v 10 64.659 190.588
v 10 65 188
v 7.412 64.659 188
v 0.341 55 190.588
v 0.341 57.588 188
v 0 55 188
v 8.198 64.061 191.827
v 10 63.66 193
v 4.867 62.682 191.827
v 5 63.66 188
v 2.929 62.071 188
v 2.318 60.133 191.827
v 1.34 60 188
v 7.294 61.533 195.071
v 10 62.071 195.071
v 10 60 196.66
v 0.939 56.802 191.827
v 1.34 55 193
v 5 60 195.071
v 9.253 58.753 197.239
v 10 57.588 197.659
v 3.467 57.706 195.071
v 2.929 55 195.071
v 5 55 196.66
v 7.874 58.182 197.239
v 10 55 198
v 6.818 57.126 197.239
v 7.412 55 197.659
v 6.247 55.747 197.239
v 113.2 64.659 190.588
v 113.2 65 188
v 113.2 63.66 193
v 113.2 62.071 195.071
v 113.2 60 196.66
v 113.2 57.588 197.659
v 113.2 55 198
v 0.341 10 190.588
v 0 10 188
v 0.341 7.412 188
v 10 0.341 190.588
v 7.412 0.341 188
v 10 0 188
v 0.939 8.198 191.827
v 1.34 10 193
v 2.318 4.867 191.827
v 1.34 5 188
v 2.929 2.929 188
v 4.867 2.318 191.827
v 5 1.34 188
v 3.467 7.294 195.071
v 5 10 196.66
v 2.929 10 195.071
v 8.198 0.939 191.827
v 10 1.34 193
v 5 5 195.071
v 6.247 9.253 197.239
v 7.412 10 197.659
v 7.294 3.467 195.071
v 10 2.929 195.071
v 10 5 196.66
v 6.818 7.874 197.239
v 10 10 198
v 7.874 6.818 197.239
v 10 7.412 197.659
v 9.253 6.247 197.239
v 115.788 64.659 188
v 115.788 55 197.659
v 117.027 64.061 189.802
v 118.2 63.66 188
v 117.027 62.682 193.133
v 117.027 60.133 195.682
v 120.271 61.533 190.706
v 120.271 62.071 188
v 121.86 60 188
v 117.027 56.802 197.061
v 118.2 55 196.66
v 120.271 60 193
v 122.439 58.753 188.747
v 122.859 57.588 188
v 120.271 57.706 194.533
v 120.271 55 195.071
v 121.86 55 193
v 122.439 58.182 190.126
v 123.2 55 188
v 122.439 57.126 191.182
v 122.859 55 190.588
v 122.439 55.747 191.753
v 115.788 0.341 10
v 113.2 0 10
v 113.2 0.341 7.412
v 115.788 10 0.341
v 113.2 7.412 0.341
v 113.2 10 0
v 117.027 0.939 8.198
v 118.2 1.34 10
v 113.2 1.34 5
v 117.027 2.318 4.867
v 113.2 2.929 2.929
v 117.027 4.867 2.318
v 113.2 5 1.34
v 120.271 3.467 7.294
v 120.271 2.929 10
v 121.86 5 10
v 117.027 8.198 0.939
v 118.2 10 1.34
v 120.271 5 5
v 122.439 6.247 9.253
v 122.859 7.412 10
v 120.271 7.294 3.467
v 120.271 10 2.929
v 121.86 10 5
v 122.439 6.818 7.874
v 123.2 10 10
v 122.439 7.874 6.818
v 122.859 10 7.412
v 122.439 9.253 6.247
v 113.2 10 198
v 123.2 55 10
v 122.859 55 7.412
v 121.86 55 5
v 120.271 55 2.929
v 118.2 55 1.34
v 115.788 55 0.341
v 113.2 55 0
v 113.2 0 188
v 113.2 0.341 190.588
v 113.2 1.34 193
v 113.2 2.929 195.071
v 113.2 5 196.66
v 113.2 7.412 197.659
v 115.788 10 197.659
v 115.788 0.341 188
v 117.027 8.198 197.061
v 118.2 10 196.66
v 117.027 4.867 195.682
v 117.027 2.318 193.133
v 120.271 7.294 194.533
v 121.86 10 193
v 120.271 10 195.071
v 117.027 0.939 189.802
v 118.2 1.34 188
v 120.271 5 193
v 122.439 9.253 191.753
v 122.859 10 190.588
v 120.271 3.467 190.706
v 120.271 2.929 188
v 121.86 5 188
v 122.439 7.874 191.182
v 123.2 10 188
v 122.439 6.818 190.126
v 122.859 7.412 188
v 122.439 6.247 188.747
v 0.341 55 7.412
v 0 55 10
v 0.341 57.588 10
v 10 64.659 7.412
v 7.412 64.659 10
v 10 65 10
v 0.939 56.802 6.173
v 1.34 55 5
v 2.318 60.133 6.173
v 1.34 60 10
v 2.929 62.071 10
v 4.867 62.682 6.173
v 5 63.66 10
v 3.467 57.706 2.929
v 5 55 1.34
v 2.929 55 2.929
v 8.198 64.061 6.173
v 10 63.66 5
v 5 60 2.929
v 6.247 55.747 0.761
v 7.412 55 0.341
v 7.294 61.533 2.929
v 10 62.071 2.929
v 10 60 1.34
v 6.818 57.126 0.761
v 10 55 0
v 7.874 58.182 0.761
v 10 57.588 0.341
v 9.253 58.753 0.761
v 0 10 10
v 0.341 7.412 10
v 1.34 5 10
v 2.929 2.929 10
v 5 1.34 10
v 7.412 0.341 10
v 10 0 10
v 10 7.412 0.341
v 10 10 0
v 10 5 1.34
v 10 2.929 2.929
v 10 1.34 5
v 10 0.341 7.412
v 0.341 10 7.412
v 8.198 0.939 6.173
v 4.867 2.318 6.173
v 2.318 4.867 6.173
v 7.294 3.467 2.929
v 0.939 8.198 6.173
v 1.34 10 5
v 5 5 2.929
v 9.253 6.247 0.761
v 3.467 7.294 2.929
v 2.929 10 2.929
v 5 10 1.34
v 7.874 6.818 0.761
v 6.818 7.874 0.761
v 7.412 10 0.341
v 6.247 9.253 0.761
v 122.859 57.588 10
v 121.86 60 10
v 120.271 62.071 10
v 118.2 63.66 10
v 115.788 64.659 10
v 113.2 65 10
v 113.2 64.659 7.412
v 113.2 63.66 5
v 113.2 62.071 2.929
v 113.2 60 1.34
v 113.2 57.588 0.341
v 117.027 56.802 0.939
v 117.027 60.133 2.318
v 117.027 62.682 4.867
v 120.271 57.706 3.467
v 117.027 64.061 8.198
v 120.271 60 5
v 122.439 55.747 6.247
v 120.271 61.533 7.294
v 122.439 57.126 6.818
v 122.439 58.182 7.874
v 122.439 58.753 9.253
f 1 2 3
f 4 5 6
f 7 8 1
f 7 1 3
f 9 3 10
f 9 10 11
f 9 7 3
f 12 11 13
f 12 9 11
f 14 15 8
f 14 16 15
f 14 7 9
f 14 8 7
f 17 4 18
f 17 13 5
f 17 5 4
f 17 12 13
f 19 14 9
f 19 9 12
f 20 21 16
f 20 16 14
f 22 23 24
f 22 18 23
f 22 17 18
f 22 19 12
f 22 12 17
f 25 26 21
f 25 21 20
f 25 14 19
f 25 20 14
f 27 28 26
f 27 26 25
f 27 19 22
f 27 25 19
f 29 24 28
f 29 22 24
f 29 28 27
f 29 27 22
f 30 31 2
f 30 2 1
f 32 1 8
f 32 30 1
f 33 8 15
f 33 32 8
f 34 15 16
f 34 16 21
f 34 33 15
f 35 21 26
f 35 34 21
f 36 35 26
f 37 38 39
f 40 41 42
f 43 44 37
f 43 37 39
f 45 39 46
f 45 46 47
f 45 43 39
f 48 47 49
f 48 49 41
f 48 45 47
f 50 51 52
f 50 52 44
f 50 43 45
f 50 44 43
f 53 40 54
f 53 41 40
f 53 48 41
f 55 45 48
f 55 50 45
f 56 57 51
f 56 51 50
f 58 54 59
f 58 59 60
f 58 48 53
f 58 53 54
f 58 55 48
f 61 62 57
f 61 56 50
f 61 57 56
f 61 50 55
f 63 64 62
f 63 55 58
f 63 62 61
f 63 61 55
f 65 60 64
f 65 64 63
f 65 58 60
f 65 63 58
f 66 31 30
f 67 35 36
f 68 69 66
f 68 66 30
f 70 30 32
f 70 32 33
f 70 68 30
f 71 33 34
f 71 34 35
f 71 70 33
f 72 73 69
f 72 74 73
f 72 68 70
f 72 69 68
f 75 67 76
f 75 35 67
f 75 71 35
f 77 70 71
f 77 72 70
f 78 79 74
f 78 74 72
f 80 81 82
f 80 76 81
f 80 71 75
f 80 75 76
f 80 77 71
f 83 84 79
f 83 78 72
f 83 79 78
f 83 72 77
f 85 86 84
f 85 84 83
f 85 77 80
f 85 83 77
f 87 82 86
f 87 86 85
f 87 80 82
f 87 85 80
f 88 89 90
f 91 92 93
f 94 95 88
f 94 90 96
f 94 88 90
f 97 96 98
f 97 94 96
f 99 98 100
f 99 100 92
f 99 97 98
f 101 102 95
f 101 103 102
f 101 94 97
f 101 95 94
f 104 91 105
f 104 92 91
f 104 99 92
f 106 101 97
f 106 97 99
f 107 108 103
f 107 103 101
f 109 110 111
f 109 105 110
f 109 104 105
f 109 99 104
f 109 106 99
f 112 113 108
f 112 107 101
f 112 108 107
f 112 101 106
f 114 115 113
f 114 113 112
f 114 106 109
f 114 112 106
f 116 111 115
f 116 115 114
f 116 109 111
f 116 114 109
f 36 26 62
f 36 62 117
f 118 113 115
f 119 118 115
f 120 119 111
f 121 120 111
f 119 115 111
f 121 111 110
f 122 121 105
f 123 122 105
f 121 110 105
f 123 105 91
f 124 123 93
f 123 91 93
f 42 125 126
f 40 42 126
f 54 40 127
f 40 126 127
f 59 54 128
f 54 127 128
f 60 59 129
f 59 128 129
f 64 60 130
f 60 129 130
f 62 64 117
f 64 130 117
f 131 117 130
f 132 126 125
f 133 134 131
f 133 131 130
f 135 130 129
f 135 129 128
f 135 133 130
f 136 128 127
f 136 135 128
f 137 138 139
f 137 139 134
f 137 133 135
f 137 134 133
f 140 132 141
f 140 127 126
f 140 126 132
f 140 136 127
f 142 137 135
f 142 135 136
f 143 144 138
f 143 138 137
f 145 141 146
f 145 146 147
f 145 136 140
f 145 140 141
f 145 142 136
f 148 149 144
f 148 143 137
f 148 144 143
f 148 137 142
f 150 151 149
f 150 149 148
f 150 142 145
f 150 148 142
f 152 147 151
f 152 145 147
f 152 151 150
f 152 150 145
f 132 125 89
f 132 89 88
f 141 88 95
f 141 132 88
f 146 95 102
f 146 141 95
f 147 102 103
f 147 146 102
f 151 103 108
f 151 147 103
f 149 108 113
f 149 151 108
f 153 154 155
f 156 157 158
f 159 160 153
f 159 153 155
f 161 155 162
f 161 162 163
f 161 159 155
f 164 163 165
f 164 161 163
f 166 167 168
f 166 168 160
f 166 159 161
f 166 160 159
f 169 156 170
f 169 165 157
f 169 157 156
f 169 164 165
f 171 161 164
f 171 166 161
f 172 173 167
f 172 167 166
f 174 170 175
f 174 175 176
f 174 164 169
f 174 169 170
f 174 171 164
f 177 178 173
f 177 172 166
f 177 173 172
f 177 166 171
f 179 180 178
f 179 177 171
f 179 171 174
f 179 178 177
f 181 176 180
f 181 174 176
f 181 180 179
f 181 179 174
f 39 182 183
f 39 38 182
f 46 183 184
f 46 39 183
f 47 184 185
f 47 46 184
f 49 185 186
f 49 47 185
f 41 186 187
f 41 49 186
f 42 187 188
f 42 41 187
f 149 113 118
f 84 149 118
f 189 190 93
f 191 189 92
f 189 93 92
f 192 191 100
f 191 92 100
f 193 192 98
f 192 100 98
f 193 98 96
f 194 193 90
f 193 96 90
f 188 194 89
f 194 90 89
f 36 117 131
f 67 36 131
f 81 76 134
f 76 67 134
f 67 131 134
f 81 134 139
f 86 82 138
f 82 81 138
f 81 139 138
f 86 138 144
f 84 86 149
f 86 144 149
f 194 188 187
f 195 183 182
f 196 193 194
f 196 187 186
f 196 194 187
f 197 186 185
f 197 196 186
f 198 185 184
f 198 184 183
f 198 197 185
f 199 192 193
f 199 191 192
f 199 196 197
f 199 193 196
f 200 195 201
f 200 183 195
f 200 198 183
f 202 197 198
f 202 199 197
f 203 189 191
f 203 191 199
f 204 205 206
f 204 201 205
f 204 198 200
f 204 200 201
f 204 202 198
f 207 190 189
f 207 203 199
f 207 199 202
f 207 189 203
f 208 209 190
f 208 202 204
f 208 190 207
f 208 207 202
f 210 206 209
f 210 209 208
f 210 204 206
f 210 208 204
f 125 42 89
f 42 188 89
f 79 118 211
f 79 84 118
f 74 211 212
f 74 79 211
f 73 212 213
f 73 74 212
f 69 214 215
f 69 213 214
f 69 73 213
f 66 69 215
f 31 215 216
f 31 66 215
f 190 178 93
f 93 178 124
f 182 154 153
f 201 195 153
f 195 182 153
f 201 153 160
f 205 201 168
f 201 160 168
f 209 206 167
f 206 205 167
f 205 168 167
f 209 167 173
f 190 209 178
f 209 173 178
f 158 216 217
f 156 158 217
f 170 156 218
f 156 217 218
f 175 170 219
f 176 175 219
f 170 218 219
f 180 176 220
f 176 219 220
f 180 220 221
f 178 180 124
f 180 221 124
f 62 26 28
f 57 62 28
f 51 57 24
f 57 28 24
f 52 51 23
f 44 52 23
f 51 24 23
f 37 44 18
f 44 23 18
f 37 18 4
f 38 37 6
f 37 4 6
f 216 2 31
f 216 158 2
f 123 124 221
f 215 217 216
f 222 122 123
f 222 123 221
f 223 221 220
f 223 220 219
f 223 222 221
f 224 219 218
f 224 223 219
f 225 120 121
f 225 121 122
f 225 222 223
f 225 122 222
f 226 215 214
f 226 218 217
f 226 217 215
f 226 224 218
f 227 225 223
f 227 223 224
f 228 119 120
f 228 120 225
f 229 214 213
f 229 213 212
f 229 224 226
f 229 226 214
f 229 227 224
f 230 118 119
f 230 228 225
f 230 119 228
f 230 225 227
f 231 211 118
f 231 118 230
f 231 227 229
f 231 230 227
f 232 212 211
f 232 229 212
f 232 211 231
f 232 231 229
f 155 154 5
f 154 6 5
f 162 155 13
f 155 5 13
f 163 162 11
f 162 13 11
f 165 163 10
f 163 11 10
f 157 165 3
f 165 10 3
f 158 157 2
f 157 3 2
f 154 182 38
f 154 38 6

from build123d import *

# Parameters (mm, degrees)
SKETCH1_W           = 123.2
SKETCH1_H           = 65
BOSS_EXTRUDE1_DEPTH = 198
FILLET1_R           = 10
FILLET2_R           = 10
FILLET3_R           = 10


with BuildPart() as part:
    # Sketch1 → Boss-Extrude1 (new body)
    with BuildSketch(Plane.XY):
        with Locations((61.6, 32.5)):
            Rectangle(SKETCH1_W, SKETCH1_H)
    extrude(amount=BOSS_EXTRUDE1_DEPTH)

    # Fillet1
    fillet1_edges = [part.edges().sort_by_distance(p)[0] for p in [
        (61.6, 65, 198),
        (61.6, 65, 0),
        (0, 65, 99),
        (123.2, 65, 99),
    ]]
    fillet(fillet1_edges, radius=FILLET1_R)

    # Fillet2
    fillet2_edges = [part.edges().sort_by_distance(p)[0] for p in [
        (61.6, 0, 198),
        (61.6, 0, 0),
        (0, 0, 99),
        (123.2, 0, 99),
    ]]
    fillet(fillet2_edges, radius=FILLET2_R)

    # Fillet3
    # the kernel refuses this fillet: 10 mm, written as the material it takes off along each edge
    with BuildSketch(Plane(origin=(113.2, 55, 10), x_dir=(0, 0, -1), z_dir=(1, 0, 0))) as fillet3_piece_1_section:
        Polygon((0, 0), (FILLET3_R * 1.02, 0), (FILLET3_R * 1.02, FILLET3_R * 1.02), (0, FILLET3_R * 1.02), align=None)
    fillet3_piece_1 = extrude(amount=FILLET3_R * 1.02, mode=Mode.PRIVATE)
    fillet3_piece_1 = fillet3_piece_1 - Plane(origin=(113.2, 55, 10), x_dir=(0, -0.7071067811865475, 0.7071067811865475), z_dir=(1, 0, 0)) * Sphere(FILLET3_R, mode=Mode.PRIVATE)
    add(fillet3_piece_1, mode=Mode.SUBTRACT)
    with BuildSketch(Plane(origin=(113.2, 55, 188), x_dir=(0, 0, 1), z_dir=(1, 0, 0))) as fillet3_piece_2_section:
        Polygon((0, 0), (FILLET3_R * 1.02, 0), (FILLET3_R * 1.02, -FILLET3_R * 1.02), (0, -FILLET3_R * 1.02), align=None)
    fillet3_piece_2 = extrude(amount=FILLET3_R * 1.02, mode=Mode.PRIVATE)
    fillet3_piece_2 = fillet3_piece_2 - Plane(origin=(113.2, 55, 188), x_dir=(0, -0.7071067811865475, -0.7071067811865475), z_dir=(1, 0, 0)) * Sphere(FILLET3_R, mode=Mode.PRIVATE)
    add(fillet3_piece_2, mode=Mode.SUBTRACT)
    with BuildSketch(Plane(origin=(10, 55, 188), x_dir=(-1, 0, 0), z_dir=(0, 0, 1))) as fillet3_piece_3_section:
        Polygon((0, 0), (FILLET3_R * 1.02, 0), (FILLET3_R * 1.02, -FILLET3_R * 1.02), (0, -FILLET3_R * 1.02), align=None)
    fillet3_piece_3 = extrude(amount=FILLET3_R * 1.02, mode=Mode.PRIVATE)
    fillet3_piece_3 = fillet3_piece_3 - Plane(origin=(10, 55, 188), x_dir=(0.7071067811865475, -0.7071067811865475, 0), z_dir=(0, 0, 1)) * Sphere(FILLET3_R, mode=Mode.PRIVATE)
    add(fillet3_piece_3, mode=Mode.SUBTRACT)
    with BuildSketch(Plane(origin=(10, 55, 10), x_dir=(-1, 0, 0), z_dir=(0, 0, -1))) as fillet3_piece_4_section:
        Polygon((0, 0), (FILLET3_R * 1.02, 0), (FILLET3_R * 1.02, FILLET3_R * 1.02), (0, FILLET3_R * 1.02), align=None)
    fillet3_piece_4 = extrude(amount=FILLET3_R * 1.02, mode=Mode.PRIVATE)
    fillet3_piece_4 = fillet3_piece_4 - Plane(origin=(10, 55, 10), x_dir=(0.7071067811865475, -0.7071067811865475, 0), z_dir=(0, 0, -1)) * Sphere(FILLET3_R, mode=Mode.PRIVATE)
    add(fillet3_piece_4, mode=Mode.SUBTRACT)
    with BuildSketch(Plane(origin=(10, 10, 10), x_dir=(-1, 0, 0), z_dir=(0, 0, -1))) as fillet3_piece_5_section:
        Polygon((0, 0), (FILLET3_R * 1.02, 0), (FILLET3_R * 1.02, -FILLET3_R * 1.02), (0, -FILLET3_R * 1.02), align=None)
    fillet3_piece_5 = extrude(amount=FILLET3_R * 1.02, mode=Mode.PRIVATE)
    fillet3_piece_5 = fillet3_piece_5 - Plane(origin=(10, 10, 10), x_dir=(0.7071067811865475, 0.7071067811865475, 0), z_dir=(0, 0, -1)) * Sphere(FILLET3_R, mode=Mode.PRIVATE)
    add(fillet3_piece_5, mode=Mode.SUBTRACT)
    with BuildSketch(Plane(origin=(10, 10, 188), x_dir=(-1, 0, 0), z_dir=(0, 0, 1))) as fillet3_piece_6_section:
        Polygon((0, 0), (FILLET3_R * 1.02, 0), (FILLET3_R * 1.02, FILLET3_R * 1.02), (0, FILLET3_R * 1.02), align=None)
    fillet3_piece_6 = extrude(amount=FILLET3_R * 1.02, mode=Mode.PRIVATE)
    fillet3_piece_6 = fillet3_piece_6 - Plane(origin=(10, 10, 188), x_dir=(0.7071067811865475, 0.7071067811865475, 0), z_dir=(0, 0, 1)) * Sphere(FILLET3_R, mode=Mode.PRIVATE)
    add(fillet3_piece_6, mode=Mode.SUBTRACT)
    with BuildSketch(Plane(origin=(113.2, 10, 188), x_dir=(0, 0, 1), z_dir=(1, 0, 0))) as fillet3_piece_7_section:
        Polygon((0, 0), (FILLET3_R * 1.02, 0), (FILLET3_R * 1.02, FILLET3_R * 1.02), (0, FILLET3_R * 1.02), align=None)
    fillet3_piece_7 = extrude(amount=FILLET3_R * 1.02, mode=Mode.PRIVATE)
    fillet3_piece_7 = fillet3_piece_7 - Plane(origin=(113.2, 10, 188), x_dir=(0, 0.7071067811865475, -0.7071067811865475), z_dir=(1, 0, 0)) * Sphere(FILLET3_R, mode=Mode.PRIVATE)
    add(fillet3_piece_7, mode=Mode.SUBTRACT)
    with BuildSketch(Plane(origin=(113.2, 10, 10), x_dir=(0, 0, -1), z_dir=(1, 0, 0))) as fillet3_piece_8_section:
        Polygon((0, 0), (FILLET3_R * 1.02, 0), (FILLET3_R * 1.02, -FILLET3_R * 1.02), (0, -FILLET3_R * 1.02), align=None)
    fillet3_piece_8 = extrude(amount=FILLET3_R * 1.02, mode=Mode.PRIVATE)
    fillet3_piece_8 = fillet3_piece_8 - Plane(origin=(113.2, 10, 10), x_dir=(0, 0.7071067811865475, 0.7071067811865475), z_dir=(1, 0, 0)) * Sphere(FILLET3_R, mode=Mode.PRIVATE)
    add(fillet3_piece_8, mode=Mode.SUBTRACT)
    with BuildSketch(Plane(origin=(0, 55, 0), x_dir=(1, 0, 0), z_dir=(0, -1, 0)), Plane(origin=(123.2, 10, 198), x_dir=(0, 0, -1), z_dir=(0, 1, 0))) as fillet3_piece_9:
        with BuildLine():
            CenterArc((FILLET3_R, FILLET3_R), FILLET3_R, 180, 90)
            Line((0, FILLET3_R), (0, 0))
            Line((0, 0), (FILLET3_R, 0))
        make_face()
    extrude(amount=45, mode=Mode.SUBTRACT)
    with BuildSketch(Plane(origin=(123.2, 10, 0), x_dir=(0, 0, 1), z_dir=(0, 1, 0)), Plane(origin=(0, 55, 198), x_dir=(1, 0, 0), z_dir=(0, -1, 0))) as fillet3_piece_10:
        with BuildLine():
            CenterArc((FILLET3_R, -FILLET3_R), FILLET3_R, 90, 90)
            Line((0, -FILLET3_R), (0, 0))
            Line((0, 0), (FILLET3_R, 0))
        make_face()
    extrude(amount=45, mode=Mode.SUBTRACT)


solid = part.part
